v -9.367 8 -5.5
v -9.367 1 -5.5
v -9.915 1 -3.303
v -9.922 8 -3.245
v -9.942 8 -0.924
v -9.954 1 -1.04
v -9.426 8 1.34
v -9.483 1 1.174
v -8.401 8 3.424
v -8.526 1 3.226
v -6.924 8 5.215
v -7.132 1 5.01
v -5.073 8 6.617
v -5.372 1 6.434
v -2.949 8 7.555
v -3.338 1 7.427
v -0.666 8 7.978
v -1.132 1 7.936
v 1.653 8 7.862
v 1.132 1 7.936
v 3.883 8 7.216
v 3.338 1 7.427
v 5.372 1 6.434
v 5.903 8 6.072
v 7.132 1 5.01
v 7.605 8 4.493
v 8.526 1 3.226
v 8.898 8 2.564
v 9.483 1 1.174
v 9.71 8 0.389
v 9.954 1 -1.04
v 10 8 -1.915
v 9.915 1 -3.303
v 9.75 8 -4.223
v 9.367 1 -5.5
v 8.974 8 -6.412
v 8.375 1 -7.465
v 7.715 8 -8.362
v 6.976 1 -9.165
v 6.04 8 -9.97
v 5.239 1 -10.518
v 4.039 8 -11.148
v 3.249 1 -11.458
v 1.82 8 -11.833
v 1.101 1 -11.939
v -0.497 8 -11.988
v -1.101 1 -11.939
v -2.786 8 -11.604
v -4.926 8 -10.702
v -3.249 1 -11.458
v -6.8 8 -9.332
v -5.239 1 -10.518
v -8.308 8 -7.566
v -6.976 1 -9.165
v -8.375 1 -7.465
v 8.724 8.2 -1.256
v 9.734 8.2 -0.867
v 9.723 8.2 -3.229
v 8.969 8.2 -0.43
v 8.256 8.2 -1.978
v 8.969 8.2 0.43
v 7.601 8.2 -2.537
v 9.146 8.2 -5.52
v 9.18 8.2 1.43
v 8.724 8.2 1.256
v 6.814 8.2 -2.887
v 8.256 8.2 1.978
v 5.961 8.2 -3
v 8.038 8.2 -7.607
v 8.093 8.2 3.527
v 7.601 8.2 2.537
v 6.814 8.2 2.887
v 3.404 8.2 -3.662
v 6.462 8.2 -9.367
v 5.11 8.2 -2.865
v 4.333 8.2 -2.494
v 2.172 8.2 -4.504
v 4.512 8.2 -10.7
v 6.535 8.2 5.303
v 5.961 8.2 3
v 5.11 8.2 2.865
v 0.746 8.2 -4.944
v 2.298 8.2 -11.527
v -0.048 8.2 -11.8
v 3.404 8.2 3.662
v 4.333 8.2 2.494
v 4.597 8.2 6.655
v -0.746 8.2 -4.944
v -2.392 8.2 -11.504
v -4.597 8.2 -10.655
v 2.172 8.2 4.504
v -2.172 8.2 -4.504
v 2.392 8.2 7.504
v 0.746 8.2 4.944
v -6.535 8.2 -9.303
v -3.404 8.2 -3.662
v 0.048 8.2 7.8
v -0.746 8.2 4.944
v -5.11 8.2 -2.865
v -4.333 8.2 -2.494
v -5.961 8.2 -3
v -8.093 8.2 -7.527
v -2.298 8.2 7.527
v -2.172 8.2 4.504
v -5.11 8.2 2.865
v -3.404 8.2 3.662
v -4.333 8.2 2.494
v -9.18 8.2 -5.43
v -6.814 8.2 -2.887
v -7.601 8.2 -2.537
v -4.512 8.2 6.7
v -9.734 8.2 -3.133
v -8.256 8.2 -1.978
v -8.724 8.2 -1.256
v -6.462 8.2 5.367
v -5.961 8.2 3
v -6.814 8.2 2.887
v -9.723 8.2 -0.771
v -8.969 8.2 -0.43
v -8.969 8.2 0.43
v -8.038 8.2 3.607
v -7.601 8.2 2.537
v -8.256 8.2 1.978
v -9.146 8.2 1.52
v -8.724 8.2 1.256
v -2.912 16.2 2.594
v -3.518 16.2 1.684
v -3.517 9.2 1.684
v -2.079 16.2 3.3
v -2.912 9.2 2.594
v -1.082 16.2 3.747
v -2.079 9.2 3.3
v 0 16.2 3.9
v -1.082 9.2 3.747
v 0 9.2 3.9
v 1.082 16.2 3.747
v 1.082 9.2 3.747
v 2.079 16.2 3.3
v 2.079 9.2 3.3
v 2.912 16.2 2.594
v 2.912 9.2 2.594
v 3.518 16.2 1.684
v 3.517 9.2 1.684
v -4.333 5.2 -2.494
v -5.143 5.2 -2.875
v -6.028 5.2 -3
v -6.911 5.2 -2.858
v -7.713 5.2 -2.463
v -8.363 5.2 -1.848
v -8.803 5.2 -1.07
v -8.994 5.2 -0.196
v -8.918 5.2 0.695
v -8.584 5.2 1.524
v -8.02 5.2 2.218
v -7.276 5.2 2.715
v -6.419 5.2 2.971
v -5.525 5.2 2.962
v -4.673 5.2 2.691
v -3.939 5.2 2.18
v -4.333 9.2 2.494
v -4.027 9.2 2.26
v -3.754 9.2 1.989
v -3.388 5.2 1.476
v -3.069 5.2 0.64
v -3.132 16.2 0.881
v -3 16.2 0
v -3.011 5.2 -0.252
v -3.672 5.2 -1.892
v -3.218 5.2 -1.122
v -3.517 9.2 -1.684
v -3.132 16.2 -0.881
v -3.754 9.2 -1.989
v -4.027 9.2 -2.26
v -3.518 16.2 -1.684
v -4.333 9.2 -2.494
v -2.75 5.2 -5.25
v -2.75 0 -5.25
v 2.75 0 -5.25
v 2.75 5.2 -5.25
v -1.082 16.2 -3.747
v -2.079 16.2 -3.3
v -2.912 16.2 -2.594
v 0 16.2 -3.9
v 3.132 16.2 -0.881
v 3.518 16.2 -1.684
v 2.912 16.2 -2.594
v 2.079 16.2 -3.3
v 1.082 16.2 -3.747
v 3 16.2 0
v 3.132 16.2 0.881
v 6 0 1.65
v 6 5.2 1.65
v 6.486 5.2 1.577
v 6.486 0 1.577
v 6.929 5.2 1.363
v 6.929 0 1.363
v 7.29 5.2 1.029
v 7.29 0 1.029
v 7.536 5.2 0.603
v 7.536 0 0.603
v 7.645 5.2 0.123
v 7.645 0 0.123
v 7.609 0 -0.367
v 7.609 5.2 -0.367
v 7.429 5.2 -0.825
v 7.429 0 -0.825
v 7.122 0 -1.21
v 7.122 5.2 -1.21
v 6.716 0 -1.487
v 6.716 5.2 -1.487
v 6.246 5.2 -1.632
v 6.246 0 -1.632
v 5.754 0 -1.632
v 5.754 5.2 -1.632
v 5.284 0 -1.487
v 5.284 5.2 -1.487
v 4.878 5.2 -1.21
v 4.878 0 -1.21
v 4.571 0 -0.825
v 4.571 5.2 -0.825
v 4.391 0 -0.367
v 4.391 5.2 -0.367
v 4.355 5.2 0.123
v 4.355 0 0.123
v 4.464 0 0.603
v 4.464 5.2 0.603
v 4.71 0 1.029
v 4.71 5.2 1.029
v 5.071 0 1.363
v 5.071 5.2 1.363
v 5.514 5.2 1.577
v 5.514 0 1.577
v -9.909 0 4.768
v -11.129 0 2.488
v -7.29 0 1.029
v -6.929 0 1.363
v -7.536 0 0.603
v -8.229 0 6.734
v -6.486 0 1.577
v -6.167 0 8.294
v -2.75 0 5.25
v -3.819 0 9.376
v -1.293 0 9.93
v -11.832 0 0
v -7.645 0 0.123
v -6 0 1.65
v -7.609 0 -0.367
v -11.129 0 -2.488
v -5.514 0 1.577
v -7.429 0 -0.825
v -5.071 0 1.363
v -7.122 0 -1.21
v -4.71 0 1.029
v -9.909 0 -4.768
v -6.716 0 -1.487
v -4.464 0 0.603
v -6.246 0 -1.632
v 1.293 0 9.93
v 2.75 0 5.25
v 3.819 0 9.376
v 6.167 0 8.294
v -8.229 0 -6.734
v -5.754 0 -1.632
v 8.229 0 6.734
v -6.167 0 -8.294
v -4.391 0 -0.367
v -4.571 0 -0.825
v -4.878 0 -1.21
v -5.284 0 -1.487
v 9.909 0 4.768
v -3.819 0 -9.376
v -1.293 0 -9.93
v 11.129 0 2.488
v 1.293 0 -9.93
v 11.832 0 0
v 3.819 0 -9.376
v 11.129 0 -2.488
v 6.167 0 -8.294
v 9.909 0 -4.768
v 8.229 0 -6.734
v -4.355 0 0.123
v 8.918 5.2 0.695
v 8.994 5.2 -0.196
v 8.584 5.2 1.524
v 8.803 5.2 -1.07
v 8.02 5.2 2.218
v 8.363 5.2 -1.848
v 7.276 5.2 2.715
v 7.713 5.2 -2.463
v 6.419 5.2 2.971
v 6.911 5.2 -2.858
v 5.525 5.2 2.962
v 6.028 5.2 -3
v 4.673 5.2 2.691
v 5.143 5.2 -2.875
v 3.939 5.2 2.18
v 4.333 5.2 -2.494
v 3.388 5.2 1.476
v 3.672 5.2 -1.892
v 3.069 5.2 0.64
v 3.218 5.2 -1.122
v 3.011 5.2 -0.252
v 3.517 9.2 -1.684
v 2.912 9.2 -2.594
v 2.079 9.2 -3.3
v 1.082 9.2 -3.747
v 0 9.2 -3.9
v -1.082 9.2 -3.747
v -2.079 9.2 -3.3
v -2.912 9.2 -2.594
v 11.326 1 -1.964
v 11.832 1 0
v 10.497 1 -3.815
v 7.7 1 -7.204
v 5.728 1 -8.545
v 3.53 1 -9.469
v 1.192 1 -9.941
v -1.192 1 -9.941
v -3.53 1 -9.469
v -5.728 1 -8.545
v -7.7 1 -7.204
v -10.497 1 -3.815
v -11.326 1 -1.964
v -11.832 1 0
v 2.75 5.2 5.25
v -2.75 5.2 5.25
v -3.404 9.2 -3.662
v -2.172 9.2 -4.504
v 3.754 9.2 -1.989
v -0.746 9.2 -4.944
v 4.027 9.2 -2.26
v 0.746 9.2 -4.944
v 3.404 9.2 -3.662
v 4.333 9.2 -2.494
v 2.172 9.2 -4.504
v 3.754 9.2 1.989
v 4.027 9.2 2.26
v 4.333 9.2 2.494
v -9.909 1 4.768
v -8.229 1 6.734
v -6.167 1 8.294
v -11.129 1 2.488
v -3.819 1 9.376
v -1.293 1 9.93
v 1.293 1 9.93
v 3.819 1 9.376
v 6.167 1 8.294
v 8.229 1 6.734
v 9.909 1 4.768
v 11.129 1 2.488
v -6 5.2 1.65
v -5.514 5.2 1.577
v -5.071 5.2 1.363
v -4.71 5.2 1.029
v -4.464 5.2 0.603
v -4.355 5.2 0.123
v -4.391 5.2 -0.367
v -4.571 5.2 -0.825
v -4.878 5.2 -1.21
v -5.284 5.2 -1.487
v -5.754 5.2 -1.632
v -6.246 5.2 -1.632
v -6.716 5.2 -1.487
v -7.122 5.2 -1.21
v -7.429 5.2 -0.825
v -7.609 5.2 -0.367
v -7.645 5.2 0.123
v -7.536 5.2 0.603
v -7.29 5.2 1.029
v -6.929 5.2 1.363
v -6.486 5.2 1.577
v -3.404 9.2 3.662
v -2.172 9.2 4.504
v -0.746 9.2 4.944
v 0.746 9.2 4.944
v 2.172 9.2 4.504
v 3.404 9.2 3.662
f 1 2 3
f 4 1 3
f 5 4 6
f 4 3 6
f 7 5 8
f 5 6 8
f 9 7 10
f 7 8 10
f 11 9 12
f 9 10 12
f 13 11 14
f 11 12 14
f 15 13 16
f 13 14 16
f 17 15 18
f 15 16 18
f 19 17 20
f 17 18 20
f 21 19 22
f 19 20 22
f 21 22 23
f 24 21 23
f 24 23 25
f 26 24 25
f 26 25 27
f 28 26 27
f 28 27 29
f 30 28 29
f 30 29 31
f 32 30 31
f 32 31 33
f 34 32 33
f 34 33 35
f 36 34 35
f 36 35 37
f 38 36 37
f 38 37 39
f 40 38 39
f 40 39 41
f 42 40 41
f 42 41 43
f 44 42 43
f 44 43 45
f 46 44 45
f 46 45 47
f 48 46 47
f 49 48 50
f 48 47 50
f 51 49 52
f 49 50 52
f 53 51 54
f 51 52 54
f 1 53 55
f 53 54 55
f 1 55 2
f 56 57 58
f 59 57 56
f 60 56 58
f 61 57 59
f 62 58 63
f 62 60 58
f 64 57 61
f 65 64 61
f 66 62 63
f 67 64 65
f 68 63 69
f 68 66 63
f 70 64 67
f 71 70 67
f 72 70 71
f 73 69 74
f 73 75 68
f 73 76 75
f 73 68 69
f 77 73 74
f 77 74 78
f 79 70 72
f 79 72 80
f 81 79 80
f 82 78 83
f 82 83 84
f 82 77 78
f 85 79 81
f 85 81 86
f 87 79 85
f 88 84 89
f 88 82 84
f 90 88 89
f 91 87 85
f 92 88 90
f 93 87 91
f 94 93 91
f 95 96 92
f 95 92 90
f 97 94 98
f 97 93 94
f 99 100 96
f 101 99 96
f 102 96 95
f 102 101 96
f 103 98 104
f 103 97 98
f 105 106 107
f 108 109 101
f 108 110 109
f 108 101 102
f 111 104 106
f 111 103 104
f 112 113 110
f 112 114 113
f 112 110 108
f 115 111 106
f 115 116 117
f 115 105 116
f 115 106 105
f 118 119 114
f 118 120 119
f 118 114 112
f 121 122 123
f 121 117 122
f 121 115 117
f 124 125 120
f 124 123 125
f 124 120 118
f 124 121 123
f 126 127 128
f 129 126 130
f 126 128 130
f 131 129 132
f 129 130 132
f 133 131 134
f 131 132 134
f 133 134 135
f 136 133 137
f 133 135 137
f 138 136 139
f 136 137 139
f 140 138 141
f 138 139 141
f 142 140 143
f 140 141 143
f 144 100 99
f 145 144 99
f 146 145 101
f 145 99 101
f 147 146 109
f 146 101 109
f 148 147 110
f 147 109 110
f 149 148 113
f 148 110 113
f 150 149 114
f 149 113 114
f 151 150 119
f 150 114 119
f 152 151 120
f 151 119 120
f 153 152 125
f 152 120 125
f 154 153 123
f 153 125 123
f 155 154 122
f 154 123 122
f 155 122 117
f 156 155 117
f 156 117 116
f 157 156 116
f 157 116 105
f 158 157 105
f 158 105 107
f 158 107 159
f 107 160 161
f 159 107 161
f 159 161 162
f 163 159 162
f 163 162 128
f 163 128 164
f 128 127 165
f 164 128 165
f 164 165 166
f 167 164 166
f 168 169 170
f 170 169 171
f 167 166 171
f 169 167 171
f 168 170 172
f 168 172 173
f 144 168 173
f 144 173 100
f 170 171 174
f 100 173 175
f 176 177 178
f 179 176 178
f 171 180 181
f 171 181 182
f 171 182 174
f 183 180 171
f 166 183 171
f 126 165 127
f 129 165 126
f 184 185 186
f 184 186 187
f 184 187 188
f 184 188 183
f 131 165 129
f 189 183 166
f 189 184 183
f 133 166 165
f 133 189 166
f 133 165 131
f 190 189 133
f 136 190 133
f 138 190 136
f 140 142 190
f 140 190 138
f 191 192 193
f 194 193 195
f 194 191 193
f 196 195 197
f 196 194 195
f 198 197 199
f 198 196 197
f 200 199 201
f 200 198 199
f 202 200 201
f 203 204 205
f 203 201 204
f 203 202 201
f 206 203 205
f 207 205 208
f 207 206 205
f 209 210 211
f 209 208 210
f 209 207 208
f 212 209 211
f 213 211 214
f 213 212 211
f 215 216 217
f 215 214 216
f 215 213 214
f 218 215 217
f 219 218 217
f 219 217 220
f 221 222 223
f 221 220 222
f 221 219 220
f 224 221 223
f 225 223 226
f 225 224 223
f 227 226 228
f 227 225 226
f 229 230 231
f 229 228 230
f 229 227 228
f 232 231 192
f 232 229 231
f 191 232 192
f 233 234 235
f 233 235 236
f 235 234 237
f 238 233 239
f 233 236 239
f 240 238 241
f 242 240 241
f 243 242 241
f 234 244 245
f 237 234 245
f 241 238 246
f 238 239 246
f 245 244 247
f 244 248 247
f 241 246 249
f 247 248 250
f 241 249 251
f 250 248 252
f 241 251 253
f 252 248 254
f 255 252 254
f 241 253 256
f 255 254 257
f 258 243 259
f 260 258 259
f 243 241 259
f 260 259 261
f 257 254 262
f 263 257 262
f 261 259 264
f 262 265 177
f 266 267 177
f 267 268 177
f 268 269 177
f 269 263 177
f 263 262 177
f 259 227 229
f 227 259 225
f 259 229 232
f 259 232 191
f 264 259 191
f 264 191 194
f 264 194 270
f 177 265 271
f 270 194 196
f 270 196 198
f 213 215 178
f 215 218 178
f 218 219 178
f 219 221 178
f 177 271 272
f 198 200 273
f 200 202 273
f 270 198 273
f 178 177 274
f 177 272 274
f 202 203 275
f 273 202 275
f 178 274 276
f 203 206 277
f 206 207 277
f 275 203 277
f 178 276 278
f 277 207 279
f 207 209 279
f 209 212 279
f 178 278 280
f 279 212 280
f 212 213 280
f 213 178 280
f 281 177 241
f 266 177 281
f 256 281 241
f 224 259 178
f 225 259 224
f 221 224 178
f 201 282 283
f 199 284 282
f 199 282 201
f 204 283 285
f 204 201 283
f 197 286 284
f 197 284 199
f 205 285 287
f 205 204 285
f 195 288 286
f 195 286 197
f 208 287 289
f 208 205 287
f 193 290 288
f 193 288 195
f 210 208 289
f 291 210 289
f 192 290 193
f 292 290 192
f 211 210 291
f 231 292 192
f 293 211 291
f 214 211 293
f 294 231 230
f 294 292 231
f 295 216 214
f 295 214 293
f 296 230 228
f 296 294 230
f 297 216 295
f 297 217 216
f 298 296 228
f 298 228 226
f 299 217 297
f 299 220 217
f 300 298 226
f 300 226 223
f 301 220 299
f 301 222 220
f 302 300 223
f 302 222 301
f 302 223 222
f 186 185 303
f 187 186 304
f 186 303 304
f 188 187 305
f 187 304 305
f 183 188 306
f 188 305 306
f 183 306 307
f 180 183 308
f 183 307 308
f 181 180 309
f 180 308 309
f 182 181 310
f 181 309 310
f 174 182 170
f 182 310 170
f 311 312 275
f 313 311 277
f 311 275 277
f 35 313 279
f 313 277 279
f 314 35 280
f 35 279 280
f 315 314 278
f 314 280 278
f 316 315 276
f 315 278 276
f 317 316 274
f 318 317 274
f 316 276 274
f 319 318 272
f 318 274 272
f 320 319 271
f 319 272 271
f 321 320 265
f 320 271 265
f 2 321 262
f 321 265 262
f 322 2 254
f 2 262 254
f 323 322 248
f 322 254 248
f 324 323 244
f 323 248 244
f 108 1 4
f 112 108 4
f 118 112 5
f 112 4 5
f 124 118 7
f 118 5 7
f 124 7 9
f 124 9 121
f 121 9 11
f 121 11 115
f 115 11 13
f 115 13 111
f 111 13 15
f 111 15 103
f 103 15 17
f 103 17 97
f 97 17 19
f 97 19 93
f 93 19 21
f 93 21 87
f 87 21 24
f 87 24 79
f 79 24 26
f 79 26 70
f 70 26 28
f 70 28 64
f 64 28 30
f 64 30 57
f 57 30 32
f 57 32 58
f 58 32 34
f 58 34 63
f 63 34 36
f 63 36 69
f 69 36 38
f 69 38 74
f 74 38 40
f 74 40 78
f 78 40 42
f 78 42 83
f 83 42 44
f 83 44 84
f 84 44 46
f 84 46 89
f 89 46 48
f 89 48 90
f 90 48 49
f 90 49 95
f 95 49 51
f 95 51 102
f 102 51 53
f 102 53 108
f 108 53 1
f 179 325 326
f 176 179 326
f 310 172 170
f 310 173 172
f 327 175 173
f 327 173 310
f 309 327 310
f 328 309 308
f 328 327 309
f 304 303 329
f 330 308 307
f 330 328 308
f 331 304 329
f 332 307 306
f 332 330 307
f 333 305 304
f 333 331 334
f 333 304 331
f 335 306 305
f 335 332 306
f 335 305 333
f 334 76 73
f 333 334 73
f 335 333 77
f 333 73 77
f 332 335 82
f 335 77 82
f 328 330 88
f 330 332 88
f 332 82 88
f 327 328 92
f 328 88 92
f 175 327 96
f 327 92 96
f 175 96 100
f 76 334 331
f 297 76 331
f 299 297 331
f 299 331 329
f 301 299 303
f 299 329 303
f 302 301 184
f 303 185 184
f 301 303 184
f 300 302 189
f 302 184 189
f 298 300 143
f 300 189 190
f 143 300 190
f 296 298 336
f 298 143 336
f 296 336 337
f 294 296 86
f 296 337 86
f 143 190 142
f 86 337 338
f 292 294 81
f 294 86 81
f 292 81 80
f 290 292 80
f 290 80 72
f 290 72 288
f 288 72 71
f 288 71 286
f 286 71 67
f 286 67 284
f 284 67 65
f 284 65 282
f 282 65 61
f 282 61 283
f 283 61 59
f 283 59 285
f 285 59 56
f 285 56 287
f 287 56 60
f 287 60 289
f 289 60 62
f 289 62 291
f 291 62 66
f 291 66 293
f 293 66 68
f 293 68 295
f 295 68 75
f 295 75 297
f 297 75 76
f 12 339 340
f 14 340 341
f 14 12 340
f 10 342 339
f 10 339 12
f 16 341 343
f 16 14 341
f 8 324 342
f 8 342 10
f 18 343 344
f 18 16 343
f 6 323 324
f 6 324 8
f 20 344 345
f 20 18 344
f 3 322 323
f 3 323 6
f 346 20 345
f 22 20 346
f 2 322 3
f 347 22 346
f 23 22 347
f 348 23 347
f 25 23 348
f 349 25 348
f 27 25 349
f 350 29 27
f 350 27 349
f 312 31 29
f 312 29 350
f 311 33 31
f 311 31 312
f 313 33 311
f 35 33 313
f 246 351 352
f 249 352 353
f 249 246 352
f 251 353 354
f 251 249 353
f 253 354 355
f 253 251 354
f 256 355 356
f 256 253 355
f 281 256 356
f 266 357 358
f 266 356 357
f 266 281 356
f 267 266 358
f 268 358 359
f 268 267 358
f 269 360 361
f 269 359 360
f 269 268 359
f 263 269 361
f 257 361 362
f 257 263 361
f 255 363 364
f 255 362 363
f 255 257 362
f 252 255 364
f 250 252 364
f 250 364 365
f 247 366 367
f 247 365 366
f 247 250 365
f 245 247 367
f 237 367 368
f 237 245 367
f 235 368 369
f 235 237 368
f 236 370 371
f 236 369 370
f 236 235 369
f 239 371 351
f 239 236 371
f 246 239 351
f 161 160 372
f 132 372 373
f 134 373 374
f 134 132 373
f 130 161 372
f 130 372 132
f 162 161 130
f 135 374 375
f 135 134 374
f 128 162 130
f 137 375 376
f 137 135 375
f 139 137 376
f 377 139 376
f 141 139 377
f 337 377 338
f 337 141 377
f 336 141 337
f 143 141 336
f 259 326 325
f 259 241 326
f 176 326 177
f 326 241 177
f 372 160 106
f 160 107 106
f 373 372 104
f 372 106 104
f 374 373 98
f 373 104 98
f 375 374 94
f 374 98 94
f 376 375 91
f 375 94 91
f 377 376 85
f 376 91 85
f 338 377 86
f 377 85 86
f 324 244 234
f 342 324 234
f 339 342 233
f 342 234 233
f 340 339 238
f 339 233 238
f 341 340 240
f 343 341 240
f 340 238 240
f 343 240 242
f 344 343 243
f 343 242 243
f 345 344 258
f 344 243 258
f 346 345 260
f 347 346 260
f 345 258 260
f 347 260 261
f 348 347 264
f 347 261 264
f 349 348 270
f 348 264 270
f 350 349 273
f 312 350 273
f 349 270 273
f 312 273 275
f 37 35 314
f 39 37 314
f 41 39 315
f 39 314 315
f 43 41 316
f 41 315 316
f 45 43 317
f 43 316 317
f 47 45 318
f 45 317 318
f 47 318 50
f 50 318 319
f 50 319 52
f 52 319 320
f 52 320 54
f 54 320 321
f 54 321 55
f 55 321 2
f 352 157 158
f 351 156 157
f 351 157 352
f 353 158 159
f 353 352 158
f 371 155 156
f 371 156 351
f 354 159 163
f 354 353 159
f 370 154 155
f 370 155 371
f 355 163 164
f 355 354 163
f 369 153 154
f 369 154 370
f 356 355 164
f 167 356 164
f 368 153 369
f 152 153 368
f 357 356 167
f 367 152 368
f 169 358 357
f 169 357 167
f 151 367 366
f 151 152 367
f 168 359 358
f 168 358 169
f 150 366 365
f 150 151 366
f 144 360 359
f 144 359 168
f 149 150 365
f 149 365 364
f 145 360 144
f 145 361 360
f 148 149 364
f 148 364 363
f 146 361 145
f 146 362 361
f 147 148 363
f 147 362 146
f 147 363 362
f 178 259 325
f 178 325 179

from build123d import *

# Parameters (mm, degrees)
SKETCH1_R               = 1.65
SKETCH1_W               = 5.5
SKETCH1_H               = 10.5
BOSS_EXTRUDE1_DEPTH     = 1
SKETCH2_R               = 10
SKETCH2_R_2             = 1.65
SKETCH2_W               = 5.5
SKETCH2_H               = 10.5
BOSS_EXTRUDE2_DEPTH     = 4.2
SKETCH3_R               = 10
SKETCH3_R_2             = 1.65
BOSS_EXTRUDE3_DEPTH     = 3
SKETCH4_R               = 5
BOSS_EXTRUDE4_DEPTH     = 1
SKETCH5_R               = 3.9
BOSS_EXTRUDE5_DEPTH     = 7
SKETCH6_R               = 3
CUT_EXTRUDE1_DEPTH      = 10
CUT_EXTRUDE1_DEPTH_BACK = 4
CHAMFER1_SIZE           = 0.2


with BuildPart() as part:
    # Sketch1 → Boss-Extrude1 (new body)
    with BuildSketch(Plane(origin=(0, 0, 0), x_dir=(1, 0, 0), z_dir=(0, 1, 0))):
        with BuildLine():
            ThreePointArc((-11.832159566, 0), (0, -10), (11.832159566, 0))
            ThreePointArc((11.832159566, 0), (0, 10), (-11.832159566, 0))
        make_face()
        with Locations(Location((-6, 0, 0), (0, 0, 270))):
            Circle(SKETCH1_R, mode=Mode.SUBTRACT)
        with Locations(Location((6, 0, 0), (0, 0, 270))):
            Circle(SKETCH1_R, mode=Mode.SUBTRACT)
        Rectangle(SKETCH1_W, SKETCH1_H, mode=Mode.SUBTRACT)
    extrude(amount=BOSS_EXTRUDE1_DEPTH)

    # Sketch2 → Boss-Extrude2 (add)
    with BuildSketch(Plane(origin=(0, 1, 0), x_dir=(1, 0, 0), z_dir=(0, 1, 0))):
        with Locations(Location((0, 2, 0), (0, 0, 159.512684885))):
            Circle(SKETCH2_R)
        with Locations(Location((6, 0, 0), (0, 0, 270))):
            Circle(SKETCH2_R_2, mode=Mode.SUBTRACT)
        with Locations(Location((-6, 0, 0), (0, 0, 270))):
            Circle(SKETCH2_R_2, mode=Mode.SUBTRACT)
        Rectangle(SKETCH2_W, SKETCH2_H, mode=Mode.SUBTRACT)
    extrude(amount=BOSS_EXTRUDE2_DEPTH)

    # Sketch3 → Boss-Extrude3 (add)
    with BuildSketch(Plane(origin=(0, 5.2, 0), x_dir=(1, 0, 0), z_dir=(0, 1, 0))):
        with Locations(Location((0, 2, 0), (0, 0, 159.512684885))):
            Circle(SKETCH3_R)
        with Locations(Location((6, 0, 0), (0, 0, 270))):
            Circle(SKETCH3_R_2, mode=Mode.SUBTRACT)
        with Locations(Location((-6, 0, 0), (0, 0, 270))):
            Circle(SKETCH3_R_2, mode=Mode.SUBTRACT)
    extrude(amount=BOSS_EXTRUDE3_DEPTH)

    # Sketch4 → Boss-Extrude4 (add)
    with BuildSketch(Plane(origin=(0, 8.2, 0), x_dir=(1, 0, 0), z_dir=(0, 1, 0))):
        with Locations(Location((0, 0, 0), (0, 0, 13.762144757))):
            Circle(SKETCH4_R)
    extrude(amount=BOSS_EXTRUDE4_DEPTH)

    # Sketch5 → Boss-Extrude5 (add)
    with BuildSketch(Plane(origin=(0, 9.2, 0), x_dir=(1, 0, 0), z_dir=(0, 1, 0))):
        with Locations(Location((0, 0, 0), (0, 0, 270))):
            Circle(SKETCH5_R)
    extrude(amount=BOSS_EXTRUDE5_DEPTH)

    # Sketch6 → Cut-Extrude1 (cut, two sides)
    with BuildSketch(Plane(origin=(0, 9.2, 0), x_dir=(1, 0, 0), z_dir=(0, 1, 0))) as cut_extrude1_sk:
        with Locations(Location((-6, 0, 0), (0, 0, 56.251011404))):
            Circle(SKETCH6_R)
        with Locations(Location((6, 0, 0), (0, 0, 123.748988596))):
            Circle(SKETCH6_R)
    extrude(amount=CUT_EXTRUDE1_DEPTH, mode=Mode.SUBTRACT)
    extrude(cut_extrude1_sk.sketch, amount=-CUT_EXTRUDE1_DEPTH_BACK, mode=Mode.SUBTRACT)

    # Chamfer1
    chamfer1_edges = [part.edges().sort_by_distance(p)[0] for p in [
        (9.367496998, 8.2, 1.5),
    ]]
    chamfer(chamfer1_edges, length=CHAMFER1_SIZE)


solid = part.part
